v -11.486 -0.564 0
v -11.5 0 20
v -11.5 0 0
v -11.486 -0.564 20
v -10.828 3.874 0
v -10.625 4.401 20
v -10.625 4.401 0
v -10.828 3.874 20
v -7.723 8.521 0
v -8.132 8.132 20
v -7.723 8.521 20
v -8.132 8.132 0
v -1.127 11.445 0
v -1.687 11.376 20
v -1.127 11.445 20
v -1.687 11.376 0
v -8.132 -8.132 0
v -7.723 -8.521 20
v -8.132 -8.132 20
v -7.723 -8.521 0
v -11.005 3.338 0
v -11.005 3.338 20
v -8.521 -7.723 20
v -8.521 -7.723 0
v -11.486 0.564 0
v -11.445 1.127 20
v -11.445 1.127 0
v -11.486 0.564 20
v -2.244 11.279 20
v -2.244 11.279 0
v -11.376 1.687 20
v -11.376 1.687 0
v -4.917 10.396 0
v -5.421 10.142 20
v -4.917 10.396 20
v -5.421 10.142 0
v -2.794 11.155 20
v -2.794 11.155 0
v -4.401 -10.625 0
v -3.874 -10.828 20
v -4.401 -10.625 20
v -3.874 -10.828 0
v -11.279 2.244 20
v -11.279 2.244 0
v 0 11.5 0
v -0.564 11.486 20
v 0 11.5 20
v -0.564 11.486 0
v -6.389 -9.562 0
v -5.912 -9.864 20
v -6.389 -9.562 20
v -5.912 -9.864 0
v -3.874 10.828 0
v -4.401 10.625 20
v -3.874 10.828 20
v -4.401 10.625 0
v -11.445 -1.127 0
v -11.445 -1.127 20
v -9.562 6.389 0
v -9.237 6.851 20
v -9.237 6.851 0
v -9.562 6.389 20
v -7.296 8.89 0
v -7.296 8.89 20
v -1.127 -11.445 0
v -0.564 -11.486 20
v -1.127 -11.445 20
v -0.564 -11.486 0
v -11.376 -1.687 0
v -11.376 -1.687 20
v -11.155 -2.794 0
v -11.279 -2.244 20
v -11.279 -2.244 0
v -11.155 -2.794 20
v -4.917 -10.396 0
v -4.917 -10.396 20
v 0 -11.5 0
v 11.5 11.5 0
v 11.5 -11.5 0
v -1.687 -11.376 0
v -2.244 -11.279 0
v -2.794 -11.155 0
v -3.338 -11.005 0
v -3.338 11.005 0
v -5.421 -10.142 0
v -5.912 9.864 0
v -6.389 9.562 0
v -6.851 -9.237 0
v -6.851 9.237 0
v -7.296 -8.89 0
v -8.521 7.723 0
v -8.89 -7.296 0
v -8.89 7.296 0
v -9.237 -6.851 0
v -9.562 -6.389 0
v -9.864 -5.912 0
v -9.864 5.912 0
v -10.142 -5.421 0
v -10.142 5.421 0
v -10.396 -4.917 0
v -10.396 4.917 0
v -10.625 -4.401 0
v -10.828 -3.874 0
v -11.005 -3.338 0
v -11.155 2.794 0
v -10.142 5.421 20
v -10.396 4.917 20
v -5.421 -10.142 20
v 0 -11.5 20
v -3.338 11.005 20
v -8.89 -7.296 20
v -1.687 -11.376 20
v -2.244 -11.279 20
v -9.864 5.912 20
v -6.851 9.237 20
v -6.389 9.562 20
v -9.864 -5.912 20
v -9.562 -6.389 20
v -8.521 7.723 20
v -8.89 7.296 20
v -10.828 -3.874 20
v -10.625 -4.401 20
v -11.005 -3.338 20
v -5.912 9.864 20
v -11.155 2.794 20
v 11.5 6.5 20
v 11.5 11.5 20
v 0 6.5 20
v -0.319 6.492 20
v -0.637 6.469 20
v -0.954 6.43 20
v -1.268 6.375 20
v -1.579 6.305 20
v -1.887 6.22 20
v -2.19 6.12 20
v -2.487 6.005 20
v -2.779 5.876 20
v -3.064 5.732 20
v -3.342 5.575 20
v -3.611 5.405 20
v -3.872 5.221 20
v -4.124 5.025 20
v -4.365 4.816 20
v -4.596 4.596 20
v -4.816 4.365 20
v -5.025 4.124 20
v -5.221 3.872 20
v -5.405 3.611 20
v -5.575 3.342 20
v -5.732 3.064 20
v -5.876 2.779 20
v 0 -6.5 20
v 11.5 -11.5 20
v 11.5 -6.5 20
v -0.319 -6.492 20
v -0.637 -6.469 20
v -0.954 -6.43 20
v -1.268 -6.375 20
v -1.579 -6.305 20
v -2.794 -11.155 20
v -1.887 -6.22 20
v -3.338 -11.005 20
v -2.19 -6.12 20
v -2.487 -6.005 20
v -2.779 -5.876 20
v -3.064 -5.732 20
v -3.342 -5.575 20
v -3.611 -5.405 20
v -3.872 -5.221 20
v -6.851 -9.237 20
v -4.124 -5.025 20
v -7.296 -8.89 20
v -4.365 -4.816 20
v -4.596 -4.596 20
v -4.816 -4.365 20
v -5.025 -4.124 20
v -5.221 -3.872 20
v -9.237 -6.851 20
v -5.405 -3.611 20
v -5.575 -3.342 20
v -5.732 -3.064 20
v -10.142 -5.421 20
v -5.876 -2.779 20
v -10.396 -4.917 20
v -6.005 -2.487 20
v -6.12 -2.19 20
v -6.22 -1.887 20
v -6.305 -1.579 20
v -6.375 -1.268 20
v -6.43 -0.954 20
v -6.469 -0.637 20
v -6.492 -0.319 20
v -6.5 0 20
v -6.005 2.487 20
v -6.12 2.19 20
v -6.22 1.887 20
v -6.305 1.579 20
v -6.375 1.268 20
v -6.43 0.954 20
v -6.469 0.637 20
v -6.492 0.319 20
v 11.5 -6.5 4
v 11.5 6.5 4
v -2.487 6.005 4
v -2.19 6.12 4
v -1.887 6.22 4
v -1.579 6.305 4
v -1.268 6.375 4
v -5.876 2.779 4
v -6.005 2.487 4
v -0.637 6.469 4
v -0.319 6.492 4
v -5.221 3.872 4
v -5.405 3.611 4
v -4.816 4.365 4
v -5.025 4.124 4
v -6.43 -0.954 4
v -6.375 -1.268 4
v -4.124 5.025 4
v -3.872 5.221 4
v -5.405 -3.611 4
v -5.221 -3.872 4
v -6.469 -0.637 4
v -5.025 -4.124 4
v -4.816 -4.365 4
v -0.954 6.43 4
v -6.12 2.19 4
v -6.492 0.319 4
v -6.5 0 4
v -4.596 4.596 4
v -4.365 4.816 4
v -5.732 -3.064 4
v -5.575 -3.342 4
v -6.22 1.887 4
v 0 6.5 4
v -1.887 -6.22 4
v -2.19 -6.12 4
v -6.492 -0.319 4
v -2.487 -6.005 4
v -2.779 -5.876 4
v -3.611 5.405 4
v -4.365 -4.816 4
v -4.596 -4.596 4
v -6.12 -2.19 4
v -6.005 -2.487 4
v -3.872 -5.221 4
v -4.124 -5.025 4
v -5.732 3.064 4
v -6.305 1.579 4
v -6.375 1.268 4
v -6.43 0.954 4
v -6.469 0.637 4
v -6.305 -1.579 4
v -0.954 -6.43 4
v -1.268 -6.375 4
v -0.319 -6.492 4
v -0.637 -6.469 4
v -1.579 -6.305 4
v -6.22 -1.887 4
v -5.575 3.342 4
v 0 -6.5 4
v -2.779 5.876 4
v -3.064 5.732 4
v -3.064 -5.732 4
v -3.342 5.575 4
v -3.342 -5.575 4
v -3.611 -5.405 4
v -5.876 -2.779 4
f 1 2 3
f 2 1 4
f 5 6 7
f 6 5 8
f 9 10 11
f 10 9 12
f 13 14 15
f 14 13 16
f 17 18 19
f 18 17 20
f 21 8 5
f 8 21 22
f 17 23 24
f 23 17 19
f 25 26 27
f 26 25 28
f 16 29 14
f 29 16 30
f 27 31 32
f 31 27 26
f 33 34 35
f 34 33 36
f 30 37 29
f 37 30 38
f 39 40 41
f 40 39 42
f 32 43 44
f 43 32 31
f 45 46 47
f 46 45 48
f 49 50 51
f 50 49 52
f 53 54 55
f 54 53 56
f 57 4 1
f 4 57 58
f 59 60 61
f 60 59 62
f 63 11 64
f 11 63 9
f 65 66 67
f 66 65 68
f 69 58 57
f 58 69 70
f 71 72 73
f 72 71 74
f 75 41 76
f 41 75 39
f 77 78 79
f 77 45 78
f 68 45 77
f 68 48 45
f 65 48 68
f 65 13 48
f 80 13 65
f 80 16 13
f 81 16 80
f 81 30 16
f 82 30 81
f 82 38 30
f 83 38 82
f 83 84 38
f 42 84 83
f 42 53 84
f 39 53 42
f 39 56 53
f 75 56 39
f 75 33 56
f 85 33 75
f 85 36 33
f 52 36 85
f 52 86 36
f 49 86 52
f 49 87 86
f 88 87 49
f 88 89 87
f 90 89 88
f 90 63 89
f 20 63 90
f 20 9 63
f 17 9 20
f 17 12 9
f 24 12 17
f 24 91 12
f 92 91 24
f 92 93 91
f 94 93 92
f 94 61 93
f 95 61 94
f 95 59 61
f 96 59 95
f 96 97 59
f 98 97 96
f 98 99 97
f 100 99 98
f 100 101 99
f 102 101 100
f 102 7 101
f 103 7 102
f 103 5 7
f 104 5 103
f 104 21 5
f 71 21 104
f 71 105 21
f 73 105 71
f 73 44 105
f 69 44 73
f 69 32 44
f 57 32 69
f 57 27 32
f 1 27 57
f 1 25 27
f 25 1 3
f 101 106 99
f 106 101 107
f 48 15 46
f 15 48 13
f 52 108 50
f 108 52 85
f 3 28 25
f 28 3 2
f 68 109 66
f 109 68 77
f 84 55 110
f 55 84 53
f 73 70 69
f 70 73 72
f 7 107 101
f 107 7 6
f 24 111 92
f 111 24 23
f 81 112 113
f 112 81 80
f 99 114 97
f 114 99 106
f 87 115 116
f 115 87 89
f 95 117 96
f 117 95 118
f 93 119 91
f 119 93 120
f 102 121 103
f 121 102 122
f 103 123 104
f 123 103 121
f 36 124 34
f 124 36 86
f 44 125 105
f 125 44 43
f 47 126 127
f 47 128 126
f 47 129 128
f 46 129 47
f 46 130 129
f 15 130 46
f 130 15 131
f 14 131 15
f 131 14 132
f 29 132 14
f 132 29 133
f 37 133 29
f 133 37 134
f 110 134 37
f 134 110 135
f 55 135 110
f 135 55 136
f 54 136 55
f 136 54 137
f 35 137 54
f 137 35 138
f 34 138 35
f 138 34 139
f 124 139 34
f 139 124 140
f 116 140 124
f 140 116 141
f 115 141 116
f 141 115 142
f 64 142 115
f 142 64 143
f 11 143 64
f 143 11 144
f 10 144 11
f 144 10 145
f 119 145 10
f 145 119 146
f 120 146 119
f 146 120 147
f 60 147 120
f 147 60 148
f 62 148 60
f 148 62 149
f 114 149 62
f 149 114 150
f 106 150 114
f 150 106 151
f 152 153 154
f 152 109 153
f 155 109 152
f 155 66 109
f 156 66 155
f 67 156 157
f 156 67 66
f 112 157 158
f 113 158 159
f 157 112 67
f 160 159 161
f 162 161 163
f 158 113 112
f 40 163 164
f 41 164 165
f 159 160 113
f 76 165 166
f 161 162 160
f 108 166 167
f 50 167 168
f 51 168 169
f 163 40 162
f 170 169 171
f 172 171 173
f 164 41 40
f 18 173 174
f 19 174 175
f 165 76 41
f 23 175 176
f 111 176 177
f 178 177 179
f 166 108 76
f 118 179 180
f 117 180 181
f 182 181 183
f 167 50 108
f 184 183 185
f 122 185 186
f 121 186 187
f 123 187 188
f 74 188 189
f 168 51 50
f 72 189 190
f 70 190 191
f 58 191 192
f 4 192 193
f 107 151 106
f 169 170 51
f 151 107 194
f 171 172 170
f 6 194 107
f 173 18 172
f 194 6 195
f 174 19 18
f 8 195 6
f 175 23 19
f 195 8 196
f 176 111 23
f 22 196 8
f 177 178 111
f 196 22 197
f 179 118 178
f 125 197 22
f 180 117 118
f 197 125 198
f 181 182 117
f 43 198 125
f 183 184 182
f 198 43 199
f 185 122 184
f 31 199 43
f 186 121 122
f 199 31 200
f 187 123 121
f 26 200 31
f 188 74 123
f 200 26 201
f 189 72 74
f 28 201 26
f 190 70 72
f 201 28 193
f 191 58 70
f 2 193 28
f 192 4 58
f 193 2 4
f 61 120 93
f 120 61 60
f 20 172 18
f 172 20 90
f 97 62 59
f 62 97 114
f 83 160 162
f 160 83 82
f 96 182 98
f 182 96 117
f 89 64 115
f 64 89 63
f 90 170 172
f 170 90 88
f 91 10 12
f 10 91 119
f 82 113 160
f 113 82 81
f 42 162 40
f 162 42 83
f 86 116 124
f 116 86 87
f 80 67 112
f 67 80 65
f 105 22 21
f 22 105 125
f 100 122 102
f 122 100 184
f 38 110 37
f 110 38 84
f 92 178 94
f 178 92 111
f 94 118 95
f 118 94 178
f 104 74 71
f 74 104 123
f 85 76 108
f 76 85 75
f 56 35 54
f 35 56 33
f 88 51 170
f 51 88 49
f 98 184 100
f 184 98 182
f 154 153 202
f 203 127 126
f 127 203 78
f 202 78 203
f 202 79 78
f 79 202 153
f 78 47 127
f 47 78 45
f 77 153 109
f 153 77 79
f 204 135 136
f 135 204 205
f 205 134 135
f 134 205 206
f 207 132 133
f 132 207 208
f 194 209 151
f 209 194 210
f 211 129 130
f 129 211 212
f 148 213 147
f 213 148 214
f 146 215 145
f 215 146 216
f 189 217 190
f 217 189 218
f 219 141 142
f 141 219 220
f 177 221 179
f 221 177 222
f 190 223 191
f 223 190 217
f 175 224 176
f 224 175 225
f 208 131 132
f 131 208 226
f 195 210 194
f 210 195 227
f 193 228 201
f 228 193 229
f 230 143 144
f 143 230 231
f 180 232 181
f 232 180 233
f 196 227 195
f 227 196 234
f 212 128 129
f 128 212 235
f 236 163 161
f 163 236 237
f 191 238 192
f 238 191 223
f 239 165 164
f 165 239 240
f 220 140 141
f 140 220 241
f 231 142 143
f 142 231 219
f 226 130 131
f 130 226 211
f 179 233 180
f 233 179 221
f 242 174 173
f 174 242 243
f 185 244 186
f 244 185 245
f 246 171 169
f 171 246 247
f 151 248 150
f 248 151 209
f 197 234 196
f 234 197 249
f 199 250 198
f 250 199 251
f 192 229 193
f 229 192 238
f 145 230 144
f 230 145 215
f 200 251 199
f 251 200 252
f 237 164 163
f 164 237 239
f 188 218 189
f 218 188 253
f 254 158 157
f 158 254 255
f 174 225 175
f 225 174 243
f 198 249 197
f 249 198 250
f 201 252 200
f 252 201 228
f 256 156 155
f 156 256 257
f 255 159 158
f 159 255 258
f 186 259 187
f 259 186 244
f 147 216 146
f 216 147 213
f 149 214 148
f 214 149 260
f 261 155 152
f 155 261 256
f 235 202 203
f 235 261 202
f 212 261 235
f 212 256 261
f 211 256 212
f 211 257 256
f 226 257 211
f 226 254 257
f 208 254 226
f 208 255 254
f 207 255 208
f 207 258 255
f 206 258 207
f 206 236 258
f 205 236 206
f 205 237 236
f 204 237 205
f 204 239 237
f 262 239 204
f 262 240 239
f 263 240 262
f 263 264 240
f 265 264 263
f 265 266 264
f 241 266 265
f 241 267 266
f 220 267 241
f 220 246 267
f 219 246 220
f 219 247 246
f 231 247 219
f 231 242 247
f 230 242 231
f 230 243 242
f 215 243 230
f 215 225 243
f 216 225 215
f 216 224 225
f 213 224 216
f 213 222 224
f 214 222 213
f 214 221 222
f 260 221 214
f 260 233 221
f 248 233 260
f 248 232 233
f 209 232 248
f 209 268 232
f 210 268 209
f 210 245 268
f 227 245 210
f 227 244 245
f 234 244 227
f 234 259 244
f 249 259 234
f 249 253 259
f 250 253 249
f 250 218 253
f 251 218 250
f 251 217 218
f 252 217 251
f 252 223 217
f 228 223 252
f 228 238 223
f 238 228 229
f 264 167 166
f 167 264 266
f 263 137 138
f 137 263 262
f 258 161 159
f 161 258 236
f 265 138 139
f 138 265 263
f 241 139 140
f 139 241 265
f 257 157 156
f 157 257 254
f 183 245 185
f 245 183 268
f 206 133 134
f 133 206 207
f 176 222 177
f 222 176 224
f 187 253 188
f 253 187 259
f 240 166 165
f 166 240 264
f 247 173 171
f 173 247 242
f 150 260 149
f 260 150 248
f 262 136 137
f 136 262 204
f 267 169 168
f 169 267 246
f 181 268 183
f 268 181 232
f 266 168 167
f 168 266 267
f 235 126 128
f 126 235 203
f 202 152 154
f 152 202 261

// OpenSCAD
// The diameter of the dowel hole in mm (you may want to add a mm or two for clearance)
dowel_d = 13;

// The diameter of the flange for mounting the dowel holder (in mm)
flange_d = 0;

/* [Dowel Customization] */

// The height of the dowel holder in mm (inclusive of the height of the flange)
dowel_h = 20;

// The thickness of the wall holding the dowele in mm
dowel_wall = 5;

/* [Flange Customization] */

// The height of the flange in mm
flange_h = 4;

// The diameter (in mm) for the holes placed for mounting the holder (0 disables the holes)
flange_hole_d = 6;

/* [Hidden] */

holder_d = dowel_d + dowel_wall*2;
$fn = 128;

module holder() {
    difference() {
        union() {
            cylinder(d = holder_d, h=dowel_h);
            translate([0, -holder_d/2, 0]) cube([dowel_d/2 + dowel_wall, holder_d, dowel_h]);
        }
        translate([0, 0, flange_h]) union() {
            cylinder(d=dowel_d, h=100);
            translate([0, -dowel_d/2, 0]) cube([100, dowel_d, 100]);
        }
    }
}

module flange() {
    difference() {
        cylinder(d = flange_d, h = flange_h);
        if (flange_hole_d > 0) {
            for (xy = [ [0, 1], [-1, 0], [0, -1] ]) {
                delta = (holder_d + (flange_d - holder_d)/2)/2;
                translate([xy[0] * delta, xy[1] * delta, 0]) cylinder(d=flange_hole_d, h=100);
            }
        }
    }
}

holder();
if (flange_d > 0) {
    flange();
}
